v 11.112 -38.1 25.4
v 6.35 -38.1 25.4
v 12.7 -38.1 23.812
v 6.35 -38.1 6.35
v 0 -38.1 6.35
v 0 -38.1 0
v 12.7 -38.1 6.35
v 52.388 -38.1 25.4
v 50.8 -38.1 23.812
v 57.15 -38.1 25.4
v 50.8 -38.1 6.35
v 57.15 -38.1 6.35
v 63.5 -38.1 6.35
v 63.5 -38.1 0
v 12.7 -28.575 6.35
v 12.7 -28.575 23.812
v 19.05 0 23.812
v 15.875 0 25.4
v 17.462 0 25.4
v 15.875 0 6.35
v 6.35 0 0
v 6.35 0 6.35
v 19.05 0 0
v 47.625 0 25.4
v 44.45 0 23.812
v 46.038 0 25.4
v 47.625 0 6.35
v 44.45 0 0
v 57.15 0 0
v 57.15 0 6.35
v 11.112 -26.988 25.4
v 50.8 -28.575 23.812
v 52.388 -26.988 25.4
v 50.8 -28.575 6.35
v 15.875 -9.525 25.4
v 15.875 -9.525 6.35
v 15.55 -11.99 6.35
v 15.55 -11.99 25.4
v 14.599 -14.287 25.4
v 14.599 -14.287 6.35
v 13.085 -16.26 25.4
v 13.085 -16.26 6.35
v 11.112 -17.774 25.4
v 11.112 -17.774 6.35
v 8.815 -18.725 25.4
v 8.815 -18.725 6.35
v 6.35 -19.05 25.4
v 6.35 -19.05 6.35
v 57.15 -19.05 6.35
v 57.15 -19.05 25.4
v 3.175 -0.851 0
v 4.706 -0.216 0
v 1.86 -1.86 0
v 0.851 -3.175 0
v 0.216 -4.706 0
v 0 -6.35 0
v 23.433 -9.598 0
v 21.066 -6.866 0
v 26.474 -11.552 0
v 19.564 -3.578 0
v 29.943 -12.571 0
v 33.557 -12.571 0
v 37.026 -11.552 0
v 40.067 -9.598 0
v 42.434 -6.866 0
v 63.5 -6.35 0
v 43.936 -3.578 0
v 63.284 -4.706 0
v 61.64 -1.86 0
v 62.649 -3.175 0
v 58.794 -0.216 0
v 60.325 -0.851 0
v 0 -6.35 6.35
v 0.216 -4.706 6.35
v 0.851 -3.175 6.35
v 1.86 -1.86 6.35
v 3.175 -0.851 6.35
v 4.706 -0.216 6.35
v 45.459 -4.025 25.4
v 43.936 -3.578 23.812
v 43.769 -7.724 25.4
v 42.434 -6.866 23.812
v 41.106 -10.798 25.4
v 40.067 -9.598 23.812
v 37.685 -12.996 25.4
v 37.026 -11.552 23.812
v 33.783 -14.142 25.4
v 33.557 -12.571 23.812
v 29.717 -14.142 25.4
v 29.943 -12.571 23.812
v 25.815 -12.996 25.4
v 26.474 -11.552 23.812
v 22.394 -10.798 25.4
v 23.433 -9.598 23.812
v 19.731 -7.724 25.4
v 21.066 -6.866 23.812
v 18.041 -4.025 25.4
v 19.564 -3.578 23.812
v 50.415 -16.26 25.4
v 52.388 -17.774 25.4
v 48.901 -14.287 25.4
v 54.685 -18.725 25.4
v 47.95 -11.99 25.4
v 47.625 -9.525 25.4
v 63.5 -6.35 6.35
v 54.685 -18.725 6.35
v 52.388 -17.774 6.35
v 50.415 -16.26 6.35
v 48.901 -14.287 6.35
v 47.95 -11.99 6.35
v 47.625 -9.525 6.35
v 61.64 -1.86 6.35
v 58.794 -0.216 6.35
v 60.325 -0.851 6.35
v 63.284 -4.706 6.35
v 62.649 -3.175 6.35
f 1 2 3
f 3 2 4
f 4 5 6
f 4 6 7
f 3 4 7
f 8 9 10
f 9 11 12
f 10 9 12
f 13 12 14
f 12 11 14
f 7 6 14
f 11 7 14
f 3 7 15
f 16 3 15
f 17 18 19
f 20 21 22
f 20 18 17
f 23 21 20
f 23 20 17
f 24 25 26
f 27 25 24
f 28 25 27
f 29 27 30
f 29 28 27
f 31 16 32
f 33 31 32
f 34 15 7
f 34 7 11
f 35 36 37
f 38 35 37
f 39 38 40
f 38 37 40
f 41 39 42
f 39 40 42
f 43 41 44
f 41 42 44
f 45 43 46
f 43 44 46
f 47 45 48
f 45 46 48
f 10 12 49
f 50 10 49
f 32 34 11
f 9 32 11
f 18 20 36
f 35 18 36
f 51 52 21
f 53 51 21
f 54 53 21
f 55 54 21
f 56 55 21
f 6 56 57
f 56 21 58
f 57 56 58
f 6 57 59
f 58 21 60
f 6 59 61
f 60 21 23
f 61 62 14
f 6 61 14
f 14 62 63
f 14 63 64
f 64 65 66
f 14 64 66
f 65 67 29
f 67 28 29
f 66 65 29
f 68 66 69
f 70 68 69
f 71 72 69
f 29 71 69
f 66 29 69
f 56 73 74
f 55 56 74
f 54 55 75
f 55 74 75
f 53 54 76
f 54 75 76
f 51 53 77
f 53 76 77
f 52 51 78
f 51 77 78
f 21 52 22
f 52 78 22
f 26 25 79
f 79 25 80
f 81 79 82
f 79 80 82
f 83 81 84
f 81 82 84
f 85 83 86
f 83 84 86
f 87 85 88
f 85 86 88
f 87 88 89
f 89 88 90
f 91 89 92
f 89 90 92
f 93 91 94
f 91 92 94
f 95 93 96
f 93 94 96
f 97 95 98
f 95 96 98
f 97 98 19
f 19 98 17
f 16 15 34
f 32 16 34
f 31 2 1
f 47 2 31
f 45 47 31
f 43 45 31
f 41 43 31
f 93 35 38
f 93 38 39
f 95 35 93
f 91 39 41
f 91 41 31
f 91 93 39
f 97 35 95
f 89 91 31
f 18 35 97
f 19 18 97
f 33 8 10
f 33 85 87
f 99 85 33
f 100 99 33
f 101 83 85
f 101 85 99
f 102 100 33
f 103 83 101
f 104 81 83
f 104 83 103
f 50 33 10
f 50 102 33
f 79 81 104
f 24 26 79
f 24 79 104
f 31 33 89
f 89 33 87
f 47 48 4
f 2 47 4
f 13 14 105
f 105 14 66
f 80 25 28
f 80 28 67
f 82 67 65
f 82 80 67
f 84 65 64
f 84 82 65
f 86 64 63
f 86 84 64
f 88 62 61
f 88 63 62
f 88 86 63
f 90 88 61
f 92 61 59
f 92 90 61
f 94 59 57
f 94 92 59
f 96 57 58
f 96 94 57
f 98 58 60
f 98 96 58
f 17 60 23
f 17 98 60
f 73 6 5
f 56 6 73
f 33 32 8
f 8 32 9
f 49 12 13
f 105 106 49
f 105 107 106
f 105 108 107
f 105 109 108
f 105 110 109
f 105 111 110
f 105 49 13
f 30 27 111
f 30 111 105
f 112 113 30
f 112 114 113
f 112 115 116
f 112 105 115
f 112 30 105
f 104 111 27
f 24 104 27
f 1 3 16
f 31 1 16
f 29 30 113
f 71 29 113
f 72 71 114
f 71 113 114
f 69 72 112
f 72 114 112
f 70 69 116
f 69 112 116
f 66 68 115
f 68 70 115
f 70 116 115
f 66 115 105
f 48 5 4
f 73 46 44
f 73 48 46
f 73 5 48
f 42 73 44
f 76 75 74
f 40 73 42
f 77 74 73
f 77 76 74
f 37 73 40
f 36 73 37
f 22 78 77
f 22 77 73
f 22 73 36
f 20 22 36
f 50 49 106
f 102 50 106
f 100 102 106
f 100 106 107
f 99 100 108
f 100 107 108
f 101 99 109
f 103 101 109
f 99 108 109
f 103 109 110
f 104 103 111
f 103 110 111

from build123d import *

# Parameters (mm, degrees)
F0_W     = 63.5
F0_H     = 38.1
F1_DEPTH = 6.35
F3_DEPTH = 19.05
F4_DEPTH = 25.4
F5_SIZE  = 1.5875
F7_DEPTH = 25.4
F9_DEPTH = 25.4


with BuildPart() as f1:
    # F0 (on Top) → F1 (new body)
    with BuildSketch(Plane.XY):
        with Locations((31.75, -19.05)):
            Rectangle(F0_W, F0_H)
    extrude(amount=F1_DEPTH)

    # F2 (on face) → F3 (join)
    with BuildSketch(Plane.XY.offset(6.35)):
        with BuildLine():
            Line((6.35, -19.05), (6.35, -38.1))
            Line((6.35, -38.1), (12.7, -38.1))
            Line((12.7, -38.1), (12.7, -28.575))
            Line((12.7, -28.575), (50.8, -28.575))
            Line((50.8, -28.575), (50.8, -38.1))
            Line((50.8, -38.1), (57.15, -38.1))
            Line((57.15, -38.1), (57.15, -19.05))
            ThreePointArc((57.15, -19.05), (50.4148079092, -16.2601920908), (47.625, -9.525))
            Line((47.625, -9.525), (47.625, 0))
            Line((47.625, 0), (44.45, 0))
            ThreePointArc((44.45, 0), (31.75, -12.7), (19.05, 0))
            Line((19.05, 0), (15.875, 0))
            Line((15.875, 0), (15.875, -9.525))
            ThreePointArc((15.875, -9.525), (13.0851920908, -16.2601920908), (6.35, -19.05))
        make_face()
    extrude(amount=F3_DEPTH)

    # F4 (cut): a face of the model
    f4_faces = [f1.faces().sort_by_distance(p)[0] for p in [
        (31.75, -5.390047406, 6.35),
    ]]
    extrude(f4_faces, amount=-F4_DEPTH, mode=Mode.SUBTRACT)

    # F5
    f5_edges = [f1.edges().sort_by_distance(p)[0] for p in [
        (12.7, -33.3375, 25.4),
        (31.75, -28.575, 25.4),
        (50.8, -33.3375, 25.4),
        (31.75, -12.7, 25.4),
    ]]
    chamfer(f5_edges, length=F5_SIZE)

    # F6 (on face) → F7 (cut)
    with BuildSketch(Plane.XY.offset(6.35)):
        with BuildLine():
            Line((6.35, 0), (0, 0))
            Line((0, 0), (0, -6.35))
            ThreePointArc((0, -6.35), (1.8598719395, -1.8598719395), (6.35, 0))
        make_face()
    extrude(amount=-F7_DEPTH, mode=Mode.SUBTRACT)

    # F8 (on face) → F9 (cut)
    with BuildSketch(Plane.XY.offset(6.35)):
        with BuildLine():
            Line((63.5, -6.35), (63.5, 0))
            Line((63.5, 0), (57.15, 0))
            ThreePointArc((57.15, 0), (61.6401280605, -1.8598719395), (63.5, -6.35))
        make_face()
    extrude(amount=-F9_DEPTH, mode=Mode.SUBTRACT)


solid = f1.part
